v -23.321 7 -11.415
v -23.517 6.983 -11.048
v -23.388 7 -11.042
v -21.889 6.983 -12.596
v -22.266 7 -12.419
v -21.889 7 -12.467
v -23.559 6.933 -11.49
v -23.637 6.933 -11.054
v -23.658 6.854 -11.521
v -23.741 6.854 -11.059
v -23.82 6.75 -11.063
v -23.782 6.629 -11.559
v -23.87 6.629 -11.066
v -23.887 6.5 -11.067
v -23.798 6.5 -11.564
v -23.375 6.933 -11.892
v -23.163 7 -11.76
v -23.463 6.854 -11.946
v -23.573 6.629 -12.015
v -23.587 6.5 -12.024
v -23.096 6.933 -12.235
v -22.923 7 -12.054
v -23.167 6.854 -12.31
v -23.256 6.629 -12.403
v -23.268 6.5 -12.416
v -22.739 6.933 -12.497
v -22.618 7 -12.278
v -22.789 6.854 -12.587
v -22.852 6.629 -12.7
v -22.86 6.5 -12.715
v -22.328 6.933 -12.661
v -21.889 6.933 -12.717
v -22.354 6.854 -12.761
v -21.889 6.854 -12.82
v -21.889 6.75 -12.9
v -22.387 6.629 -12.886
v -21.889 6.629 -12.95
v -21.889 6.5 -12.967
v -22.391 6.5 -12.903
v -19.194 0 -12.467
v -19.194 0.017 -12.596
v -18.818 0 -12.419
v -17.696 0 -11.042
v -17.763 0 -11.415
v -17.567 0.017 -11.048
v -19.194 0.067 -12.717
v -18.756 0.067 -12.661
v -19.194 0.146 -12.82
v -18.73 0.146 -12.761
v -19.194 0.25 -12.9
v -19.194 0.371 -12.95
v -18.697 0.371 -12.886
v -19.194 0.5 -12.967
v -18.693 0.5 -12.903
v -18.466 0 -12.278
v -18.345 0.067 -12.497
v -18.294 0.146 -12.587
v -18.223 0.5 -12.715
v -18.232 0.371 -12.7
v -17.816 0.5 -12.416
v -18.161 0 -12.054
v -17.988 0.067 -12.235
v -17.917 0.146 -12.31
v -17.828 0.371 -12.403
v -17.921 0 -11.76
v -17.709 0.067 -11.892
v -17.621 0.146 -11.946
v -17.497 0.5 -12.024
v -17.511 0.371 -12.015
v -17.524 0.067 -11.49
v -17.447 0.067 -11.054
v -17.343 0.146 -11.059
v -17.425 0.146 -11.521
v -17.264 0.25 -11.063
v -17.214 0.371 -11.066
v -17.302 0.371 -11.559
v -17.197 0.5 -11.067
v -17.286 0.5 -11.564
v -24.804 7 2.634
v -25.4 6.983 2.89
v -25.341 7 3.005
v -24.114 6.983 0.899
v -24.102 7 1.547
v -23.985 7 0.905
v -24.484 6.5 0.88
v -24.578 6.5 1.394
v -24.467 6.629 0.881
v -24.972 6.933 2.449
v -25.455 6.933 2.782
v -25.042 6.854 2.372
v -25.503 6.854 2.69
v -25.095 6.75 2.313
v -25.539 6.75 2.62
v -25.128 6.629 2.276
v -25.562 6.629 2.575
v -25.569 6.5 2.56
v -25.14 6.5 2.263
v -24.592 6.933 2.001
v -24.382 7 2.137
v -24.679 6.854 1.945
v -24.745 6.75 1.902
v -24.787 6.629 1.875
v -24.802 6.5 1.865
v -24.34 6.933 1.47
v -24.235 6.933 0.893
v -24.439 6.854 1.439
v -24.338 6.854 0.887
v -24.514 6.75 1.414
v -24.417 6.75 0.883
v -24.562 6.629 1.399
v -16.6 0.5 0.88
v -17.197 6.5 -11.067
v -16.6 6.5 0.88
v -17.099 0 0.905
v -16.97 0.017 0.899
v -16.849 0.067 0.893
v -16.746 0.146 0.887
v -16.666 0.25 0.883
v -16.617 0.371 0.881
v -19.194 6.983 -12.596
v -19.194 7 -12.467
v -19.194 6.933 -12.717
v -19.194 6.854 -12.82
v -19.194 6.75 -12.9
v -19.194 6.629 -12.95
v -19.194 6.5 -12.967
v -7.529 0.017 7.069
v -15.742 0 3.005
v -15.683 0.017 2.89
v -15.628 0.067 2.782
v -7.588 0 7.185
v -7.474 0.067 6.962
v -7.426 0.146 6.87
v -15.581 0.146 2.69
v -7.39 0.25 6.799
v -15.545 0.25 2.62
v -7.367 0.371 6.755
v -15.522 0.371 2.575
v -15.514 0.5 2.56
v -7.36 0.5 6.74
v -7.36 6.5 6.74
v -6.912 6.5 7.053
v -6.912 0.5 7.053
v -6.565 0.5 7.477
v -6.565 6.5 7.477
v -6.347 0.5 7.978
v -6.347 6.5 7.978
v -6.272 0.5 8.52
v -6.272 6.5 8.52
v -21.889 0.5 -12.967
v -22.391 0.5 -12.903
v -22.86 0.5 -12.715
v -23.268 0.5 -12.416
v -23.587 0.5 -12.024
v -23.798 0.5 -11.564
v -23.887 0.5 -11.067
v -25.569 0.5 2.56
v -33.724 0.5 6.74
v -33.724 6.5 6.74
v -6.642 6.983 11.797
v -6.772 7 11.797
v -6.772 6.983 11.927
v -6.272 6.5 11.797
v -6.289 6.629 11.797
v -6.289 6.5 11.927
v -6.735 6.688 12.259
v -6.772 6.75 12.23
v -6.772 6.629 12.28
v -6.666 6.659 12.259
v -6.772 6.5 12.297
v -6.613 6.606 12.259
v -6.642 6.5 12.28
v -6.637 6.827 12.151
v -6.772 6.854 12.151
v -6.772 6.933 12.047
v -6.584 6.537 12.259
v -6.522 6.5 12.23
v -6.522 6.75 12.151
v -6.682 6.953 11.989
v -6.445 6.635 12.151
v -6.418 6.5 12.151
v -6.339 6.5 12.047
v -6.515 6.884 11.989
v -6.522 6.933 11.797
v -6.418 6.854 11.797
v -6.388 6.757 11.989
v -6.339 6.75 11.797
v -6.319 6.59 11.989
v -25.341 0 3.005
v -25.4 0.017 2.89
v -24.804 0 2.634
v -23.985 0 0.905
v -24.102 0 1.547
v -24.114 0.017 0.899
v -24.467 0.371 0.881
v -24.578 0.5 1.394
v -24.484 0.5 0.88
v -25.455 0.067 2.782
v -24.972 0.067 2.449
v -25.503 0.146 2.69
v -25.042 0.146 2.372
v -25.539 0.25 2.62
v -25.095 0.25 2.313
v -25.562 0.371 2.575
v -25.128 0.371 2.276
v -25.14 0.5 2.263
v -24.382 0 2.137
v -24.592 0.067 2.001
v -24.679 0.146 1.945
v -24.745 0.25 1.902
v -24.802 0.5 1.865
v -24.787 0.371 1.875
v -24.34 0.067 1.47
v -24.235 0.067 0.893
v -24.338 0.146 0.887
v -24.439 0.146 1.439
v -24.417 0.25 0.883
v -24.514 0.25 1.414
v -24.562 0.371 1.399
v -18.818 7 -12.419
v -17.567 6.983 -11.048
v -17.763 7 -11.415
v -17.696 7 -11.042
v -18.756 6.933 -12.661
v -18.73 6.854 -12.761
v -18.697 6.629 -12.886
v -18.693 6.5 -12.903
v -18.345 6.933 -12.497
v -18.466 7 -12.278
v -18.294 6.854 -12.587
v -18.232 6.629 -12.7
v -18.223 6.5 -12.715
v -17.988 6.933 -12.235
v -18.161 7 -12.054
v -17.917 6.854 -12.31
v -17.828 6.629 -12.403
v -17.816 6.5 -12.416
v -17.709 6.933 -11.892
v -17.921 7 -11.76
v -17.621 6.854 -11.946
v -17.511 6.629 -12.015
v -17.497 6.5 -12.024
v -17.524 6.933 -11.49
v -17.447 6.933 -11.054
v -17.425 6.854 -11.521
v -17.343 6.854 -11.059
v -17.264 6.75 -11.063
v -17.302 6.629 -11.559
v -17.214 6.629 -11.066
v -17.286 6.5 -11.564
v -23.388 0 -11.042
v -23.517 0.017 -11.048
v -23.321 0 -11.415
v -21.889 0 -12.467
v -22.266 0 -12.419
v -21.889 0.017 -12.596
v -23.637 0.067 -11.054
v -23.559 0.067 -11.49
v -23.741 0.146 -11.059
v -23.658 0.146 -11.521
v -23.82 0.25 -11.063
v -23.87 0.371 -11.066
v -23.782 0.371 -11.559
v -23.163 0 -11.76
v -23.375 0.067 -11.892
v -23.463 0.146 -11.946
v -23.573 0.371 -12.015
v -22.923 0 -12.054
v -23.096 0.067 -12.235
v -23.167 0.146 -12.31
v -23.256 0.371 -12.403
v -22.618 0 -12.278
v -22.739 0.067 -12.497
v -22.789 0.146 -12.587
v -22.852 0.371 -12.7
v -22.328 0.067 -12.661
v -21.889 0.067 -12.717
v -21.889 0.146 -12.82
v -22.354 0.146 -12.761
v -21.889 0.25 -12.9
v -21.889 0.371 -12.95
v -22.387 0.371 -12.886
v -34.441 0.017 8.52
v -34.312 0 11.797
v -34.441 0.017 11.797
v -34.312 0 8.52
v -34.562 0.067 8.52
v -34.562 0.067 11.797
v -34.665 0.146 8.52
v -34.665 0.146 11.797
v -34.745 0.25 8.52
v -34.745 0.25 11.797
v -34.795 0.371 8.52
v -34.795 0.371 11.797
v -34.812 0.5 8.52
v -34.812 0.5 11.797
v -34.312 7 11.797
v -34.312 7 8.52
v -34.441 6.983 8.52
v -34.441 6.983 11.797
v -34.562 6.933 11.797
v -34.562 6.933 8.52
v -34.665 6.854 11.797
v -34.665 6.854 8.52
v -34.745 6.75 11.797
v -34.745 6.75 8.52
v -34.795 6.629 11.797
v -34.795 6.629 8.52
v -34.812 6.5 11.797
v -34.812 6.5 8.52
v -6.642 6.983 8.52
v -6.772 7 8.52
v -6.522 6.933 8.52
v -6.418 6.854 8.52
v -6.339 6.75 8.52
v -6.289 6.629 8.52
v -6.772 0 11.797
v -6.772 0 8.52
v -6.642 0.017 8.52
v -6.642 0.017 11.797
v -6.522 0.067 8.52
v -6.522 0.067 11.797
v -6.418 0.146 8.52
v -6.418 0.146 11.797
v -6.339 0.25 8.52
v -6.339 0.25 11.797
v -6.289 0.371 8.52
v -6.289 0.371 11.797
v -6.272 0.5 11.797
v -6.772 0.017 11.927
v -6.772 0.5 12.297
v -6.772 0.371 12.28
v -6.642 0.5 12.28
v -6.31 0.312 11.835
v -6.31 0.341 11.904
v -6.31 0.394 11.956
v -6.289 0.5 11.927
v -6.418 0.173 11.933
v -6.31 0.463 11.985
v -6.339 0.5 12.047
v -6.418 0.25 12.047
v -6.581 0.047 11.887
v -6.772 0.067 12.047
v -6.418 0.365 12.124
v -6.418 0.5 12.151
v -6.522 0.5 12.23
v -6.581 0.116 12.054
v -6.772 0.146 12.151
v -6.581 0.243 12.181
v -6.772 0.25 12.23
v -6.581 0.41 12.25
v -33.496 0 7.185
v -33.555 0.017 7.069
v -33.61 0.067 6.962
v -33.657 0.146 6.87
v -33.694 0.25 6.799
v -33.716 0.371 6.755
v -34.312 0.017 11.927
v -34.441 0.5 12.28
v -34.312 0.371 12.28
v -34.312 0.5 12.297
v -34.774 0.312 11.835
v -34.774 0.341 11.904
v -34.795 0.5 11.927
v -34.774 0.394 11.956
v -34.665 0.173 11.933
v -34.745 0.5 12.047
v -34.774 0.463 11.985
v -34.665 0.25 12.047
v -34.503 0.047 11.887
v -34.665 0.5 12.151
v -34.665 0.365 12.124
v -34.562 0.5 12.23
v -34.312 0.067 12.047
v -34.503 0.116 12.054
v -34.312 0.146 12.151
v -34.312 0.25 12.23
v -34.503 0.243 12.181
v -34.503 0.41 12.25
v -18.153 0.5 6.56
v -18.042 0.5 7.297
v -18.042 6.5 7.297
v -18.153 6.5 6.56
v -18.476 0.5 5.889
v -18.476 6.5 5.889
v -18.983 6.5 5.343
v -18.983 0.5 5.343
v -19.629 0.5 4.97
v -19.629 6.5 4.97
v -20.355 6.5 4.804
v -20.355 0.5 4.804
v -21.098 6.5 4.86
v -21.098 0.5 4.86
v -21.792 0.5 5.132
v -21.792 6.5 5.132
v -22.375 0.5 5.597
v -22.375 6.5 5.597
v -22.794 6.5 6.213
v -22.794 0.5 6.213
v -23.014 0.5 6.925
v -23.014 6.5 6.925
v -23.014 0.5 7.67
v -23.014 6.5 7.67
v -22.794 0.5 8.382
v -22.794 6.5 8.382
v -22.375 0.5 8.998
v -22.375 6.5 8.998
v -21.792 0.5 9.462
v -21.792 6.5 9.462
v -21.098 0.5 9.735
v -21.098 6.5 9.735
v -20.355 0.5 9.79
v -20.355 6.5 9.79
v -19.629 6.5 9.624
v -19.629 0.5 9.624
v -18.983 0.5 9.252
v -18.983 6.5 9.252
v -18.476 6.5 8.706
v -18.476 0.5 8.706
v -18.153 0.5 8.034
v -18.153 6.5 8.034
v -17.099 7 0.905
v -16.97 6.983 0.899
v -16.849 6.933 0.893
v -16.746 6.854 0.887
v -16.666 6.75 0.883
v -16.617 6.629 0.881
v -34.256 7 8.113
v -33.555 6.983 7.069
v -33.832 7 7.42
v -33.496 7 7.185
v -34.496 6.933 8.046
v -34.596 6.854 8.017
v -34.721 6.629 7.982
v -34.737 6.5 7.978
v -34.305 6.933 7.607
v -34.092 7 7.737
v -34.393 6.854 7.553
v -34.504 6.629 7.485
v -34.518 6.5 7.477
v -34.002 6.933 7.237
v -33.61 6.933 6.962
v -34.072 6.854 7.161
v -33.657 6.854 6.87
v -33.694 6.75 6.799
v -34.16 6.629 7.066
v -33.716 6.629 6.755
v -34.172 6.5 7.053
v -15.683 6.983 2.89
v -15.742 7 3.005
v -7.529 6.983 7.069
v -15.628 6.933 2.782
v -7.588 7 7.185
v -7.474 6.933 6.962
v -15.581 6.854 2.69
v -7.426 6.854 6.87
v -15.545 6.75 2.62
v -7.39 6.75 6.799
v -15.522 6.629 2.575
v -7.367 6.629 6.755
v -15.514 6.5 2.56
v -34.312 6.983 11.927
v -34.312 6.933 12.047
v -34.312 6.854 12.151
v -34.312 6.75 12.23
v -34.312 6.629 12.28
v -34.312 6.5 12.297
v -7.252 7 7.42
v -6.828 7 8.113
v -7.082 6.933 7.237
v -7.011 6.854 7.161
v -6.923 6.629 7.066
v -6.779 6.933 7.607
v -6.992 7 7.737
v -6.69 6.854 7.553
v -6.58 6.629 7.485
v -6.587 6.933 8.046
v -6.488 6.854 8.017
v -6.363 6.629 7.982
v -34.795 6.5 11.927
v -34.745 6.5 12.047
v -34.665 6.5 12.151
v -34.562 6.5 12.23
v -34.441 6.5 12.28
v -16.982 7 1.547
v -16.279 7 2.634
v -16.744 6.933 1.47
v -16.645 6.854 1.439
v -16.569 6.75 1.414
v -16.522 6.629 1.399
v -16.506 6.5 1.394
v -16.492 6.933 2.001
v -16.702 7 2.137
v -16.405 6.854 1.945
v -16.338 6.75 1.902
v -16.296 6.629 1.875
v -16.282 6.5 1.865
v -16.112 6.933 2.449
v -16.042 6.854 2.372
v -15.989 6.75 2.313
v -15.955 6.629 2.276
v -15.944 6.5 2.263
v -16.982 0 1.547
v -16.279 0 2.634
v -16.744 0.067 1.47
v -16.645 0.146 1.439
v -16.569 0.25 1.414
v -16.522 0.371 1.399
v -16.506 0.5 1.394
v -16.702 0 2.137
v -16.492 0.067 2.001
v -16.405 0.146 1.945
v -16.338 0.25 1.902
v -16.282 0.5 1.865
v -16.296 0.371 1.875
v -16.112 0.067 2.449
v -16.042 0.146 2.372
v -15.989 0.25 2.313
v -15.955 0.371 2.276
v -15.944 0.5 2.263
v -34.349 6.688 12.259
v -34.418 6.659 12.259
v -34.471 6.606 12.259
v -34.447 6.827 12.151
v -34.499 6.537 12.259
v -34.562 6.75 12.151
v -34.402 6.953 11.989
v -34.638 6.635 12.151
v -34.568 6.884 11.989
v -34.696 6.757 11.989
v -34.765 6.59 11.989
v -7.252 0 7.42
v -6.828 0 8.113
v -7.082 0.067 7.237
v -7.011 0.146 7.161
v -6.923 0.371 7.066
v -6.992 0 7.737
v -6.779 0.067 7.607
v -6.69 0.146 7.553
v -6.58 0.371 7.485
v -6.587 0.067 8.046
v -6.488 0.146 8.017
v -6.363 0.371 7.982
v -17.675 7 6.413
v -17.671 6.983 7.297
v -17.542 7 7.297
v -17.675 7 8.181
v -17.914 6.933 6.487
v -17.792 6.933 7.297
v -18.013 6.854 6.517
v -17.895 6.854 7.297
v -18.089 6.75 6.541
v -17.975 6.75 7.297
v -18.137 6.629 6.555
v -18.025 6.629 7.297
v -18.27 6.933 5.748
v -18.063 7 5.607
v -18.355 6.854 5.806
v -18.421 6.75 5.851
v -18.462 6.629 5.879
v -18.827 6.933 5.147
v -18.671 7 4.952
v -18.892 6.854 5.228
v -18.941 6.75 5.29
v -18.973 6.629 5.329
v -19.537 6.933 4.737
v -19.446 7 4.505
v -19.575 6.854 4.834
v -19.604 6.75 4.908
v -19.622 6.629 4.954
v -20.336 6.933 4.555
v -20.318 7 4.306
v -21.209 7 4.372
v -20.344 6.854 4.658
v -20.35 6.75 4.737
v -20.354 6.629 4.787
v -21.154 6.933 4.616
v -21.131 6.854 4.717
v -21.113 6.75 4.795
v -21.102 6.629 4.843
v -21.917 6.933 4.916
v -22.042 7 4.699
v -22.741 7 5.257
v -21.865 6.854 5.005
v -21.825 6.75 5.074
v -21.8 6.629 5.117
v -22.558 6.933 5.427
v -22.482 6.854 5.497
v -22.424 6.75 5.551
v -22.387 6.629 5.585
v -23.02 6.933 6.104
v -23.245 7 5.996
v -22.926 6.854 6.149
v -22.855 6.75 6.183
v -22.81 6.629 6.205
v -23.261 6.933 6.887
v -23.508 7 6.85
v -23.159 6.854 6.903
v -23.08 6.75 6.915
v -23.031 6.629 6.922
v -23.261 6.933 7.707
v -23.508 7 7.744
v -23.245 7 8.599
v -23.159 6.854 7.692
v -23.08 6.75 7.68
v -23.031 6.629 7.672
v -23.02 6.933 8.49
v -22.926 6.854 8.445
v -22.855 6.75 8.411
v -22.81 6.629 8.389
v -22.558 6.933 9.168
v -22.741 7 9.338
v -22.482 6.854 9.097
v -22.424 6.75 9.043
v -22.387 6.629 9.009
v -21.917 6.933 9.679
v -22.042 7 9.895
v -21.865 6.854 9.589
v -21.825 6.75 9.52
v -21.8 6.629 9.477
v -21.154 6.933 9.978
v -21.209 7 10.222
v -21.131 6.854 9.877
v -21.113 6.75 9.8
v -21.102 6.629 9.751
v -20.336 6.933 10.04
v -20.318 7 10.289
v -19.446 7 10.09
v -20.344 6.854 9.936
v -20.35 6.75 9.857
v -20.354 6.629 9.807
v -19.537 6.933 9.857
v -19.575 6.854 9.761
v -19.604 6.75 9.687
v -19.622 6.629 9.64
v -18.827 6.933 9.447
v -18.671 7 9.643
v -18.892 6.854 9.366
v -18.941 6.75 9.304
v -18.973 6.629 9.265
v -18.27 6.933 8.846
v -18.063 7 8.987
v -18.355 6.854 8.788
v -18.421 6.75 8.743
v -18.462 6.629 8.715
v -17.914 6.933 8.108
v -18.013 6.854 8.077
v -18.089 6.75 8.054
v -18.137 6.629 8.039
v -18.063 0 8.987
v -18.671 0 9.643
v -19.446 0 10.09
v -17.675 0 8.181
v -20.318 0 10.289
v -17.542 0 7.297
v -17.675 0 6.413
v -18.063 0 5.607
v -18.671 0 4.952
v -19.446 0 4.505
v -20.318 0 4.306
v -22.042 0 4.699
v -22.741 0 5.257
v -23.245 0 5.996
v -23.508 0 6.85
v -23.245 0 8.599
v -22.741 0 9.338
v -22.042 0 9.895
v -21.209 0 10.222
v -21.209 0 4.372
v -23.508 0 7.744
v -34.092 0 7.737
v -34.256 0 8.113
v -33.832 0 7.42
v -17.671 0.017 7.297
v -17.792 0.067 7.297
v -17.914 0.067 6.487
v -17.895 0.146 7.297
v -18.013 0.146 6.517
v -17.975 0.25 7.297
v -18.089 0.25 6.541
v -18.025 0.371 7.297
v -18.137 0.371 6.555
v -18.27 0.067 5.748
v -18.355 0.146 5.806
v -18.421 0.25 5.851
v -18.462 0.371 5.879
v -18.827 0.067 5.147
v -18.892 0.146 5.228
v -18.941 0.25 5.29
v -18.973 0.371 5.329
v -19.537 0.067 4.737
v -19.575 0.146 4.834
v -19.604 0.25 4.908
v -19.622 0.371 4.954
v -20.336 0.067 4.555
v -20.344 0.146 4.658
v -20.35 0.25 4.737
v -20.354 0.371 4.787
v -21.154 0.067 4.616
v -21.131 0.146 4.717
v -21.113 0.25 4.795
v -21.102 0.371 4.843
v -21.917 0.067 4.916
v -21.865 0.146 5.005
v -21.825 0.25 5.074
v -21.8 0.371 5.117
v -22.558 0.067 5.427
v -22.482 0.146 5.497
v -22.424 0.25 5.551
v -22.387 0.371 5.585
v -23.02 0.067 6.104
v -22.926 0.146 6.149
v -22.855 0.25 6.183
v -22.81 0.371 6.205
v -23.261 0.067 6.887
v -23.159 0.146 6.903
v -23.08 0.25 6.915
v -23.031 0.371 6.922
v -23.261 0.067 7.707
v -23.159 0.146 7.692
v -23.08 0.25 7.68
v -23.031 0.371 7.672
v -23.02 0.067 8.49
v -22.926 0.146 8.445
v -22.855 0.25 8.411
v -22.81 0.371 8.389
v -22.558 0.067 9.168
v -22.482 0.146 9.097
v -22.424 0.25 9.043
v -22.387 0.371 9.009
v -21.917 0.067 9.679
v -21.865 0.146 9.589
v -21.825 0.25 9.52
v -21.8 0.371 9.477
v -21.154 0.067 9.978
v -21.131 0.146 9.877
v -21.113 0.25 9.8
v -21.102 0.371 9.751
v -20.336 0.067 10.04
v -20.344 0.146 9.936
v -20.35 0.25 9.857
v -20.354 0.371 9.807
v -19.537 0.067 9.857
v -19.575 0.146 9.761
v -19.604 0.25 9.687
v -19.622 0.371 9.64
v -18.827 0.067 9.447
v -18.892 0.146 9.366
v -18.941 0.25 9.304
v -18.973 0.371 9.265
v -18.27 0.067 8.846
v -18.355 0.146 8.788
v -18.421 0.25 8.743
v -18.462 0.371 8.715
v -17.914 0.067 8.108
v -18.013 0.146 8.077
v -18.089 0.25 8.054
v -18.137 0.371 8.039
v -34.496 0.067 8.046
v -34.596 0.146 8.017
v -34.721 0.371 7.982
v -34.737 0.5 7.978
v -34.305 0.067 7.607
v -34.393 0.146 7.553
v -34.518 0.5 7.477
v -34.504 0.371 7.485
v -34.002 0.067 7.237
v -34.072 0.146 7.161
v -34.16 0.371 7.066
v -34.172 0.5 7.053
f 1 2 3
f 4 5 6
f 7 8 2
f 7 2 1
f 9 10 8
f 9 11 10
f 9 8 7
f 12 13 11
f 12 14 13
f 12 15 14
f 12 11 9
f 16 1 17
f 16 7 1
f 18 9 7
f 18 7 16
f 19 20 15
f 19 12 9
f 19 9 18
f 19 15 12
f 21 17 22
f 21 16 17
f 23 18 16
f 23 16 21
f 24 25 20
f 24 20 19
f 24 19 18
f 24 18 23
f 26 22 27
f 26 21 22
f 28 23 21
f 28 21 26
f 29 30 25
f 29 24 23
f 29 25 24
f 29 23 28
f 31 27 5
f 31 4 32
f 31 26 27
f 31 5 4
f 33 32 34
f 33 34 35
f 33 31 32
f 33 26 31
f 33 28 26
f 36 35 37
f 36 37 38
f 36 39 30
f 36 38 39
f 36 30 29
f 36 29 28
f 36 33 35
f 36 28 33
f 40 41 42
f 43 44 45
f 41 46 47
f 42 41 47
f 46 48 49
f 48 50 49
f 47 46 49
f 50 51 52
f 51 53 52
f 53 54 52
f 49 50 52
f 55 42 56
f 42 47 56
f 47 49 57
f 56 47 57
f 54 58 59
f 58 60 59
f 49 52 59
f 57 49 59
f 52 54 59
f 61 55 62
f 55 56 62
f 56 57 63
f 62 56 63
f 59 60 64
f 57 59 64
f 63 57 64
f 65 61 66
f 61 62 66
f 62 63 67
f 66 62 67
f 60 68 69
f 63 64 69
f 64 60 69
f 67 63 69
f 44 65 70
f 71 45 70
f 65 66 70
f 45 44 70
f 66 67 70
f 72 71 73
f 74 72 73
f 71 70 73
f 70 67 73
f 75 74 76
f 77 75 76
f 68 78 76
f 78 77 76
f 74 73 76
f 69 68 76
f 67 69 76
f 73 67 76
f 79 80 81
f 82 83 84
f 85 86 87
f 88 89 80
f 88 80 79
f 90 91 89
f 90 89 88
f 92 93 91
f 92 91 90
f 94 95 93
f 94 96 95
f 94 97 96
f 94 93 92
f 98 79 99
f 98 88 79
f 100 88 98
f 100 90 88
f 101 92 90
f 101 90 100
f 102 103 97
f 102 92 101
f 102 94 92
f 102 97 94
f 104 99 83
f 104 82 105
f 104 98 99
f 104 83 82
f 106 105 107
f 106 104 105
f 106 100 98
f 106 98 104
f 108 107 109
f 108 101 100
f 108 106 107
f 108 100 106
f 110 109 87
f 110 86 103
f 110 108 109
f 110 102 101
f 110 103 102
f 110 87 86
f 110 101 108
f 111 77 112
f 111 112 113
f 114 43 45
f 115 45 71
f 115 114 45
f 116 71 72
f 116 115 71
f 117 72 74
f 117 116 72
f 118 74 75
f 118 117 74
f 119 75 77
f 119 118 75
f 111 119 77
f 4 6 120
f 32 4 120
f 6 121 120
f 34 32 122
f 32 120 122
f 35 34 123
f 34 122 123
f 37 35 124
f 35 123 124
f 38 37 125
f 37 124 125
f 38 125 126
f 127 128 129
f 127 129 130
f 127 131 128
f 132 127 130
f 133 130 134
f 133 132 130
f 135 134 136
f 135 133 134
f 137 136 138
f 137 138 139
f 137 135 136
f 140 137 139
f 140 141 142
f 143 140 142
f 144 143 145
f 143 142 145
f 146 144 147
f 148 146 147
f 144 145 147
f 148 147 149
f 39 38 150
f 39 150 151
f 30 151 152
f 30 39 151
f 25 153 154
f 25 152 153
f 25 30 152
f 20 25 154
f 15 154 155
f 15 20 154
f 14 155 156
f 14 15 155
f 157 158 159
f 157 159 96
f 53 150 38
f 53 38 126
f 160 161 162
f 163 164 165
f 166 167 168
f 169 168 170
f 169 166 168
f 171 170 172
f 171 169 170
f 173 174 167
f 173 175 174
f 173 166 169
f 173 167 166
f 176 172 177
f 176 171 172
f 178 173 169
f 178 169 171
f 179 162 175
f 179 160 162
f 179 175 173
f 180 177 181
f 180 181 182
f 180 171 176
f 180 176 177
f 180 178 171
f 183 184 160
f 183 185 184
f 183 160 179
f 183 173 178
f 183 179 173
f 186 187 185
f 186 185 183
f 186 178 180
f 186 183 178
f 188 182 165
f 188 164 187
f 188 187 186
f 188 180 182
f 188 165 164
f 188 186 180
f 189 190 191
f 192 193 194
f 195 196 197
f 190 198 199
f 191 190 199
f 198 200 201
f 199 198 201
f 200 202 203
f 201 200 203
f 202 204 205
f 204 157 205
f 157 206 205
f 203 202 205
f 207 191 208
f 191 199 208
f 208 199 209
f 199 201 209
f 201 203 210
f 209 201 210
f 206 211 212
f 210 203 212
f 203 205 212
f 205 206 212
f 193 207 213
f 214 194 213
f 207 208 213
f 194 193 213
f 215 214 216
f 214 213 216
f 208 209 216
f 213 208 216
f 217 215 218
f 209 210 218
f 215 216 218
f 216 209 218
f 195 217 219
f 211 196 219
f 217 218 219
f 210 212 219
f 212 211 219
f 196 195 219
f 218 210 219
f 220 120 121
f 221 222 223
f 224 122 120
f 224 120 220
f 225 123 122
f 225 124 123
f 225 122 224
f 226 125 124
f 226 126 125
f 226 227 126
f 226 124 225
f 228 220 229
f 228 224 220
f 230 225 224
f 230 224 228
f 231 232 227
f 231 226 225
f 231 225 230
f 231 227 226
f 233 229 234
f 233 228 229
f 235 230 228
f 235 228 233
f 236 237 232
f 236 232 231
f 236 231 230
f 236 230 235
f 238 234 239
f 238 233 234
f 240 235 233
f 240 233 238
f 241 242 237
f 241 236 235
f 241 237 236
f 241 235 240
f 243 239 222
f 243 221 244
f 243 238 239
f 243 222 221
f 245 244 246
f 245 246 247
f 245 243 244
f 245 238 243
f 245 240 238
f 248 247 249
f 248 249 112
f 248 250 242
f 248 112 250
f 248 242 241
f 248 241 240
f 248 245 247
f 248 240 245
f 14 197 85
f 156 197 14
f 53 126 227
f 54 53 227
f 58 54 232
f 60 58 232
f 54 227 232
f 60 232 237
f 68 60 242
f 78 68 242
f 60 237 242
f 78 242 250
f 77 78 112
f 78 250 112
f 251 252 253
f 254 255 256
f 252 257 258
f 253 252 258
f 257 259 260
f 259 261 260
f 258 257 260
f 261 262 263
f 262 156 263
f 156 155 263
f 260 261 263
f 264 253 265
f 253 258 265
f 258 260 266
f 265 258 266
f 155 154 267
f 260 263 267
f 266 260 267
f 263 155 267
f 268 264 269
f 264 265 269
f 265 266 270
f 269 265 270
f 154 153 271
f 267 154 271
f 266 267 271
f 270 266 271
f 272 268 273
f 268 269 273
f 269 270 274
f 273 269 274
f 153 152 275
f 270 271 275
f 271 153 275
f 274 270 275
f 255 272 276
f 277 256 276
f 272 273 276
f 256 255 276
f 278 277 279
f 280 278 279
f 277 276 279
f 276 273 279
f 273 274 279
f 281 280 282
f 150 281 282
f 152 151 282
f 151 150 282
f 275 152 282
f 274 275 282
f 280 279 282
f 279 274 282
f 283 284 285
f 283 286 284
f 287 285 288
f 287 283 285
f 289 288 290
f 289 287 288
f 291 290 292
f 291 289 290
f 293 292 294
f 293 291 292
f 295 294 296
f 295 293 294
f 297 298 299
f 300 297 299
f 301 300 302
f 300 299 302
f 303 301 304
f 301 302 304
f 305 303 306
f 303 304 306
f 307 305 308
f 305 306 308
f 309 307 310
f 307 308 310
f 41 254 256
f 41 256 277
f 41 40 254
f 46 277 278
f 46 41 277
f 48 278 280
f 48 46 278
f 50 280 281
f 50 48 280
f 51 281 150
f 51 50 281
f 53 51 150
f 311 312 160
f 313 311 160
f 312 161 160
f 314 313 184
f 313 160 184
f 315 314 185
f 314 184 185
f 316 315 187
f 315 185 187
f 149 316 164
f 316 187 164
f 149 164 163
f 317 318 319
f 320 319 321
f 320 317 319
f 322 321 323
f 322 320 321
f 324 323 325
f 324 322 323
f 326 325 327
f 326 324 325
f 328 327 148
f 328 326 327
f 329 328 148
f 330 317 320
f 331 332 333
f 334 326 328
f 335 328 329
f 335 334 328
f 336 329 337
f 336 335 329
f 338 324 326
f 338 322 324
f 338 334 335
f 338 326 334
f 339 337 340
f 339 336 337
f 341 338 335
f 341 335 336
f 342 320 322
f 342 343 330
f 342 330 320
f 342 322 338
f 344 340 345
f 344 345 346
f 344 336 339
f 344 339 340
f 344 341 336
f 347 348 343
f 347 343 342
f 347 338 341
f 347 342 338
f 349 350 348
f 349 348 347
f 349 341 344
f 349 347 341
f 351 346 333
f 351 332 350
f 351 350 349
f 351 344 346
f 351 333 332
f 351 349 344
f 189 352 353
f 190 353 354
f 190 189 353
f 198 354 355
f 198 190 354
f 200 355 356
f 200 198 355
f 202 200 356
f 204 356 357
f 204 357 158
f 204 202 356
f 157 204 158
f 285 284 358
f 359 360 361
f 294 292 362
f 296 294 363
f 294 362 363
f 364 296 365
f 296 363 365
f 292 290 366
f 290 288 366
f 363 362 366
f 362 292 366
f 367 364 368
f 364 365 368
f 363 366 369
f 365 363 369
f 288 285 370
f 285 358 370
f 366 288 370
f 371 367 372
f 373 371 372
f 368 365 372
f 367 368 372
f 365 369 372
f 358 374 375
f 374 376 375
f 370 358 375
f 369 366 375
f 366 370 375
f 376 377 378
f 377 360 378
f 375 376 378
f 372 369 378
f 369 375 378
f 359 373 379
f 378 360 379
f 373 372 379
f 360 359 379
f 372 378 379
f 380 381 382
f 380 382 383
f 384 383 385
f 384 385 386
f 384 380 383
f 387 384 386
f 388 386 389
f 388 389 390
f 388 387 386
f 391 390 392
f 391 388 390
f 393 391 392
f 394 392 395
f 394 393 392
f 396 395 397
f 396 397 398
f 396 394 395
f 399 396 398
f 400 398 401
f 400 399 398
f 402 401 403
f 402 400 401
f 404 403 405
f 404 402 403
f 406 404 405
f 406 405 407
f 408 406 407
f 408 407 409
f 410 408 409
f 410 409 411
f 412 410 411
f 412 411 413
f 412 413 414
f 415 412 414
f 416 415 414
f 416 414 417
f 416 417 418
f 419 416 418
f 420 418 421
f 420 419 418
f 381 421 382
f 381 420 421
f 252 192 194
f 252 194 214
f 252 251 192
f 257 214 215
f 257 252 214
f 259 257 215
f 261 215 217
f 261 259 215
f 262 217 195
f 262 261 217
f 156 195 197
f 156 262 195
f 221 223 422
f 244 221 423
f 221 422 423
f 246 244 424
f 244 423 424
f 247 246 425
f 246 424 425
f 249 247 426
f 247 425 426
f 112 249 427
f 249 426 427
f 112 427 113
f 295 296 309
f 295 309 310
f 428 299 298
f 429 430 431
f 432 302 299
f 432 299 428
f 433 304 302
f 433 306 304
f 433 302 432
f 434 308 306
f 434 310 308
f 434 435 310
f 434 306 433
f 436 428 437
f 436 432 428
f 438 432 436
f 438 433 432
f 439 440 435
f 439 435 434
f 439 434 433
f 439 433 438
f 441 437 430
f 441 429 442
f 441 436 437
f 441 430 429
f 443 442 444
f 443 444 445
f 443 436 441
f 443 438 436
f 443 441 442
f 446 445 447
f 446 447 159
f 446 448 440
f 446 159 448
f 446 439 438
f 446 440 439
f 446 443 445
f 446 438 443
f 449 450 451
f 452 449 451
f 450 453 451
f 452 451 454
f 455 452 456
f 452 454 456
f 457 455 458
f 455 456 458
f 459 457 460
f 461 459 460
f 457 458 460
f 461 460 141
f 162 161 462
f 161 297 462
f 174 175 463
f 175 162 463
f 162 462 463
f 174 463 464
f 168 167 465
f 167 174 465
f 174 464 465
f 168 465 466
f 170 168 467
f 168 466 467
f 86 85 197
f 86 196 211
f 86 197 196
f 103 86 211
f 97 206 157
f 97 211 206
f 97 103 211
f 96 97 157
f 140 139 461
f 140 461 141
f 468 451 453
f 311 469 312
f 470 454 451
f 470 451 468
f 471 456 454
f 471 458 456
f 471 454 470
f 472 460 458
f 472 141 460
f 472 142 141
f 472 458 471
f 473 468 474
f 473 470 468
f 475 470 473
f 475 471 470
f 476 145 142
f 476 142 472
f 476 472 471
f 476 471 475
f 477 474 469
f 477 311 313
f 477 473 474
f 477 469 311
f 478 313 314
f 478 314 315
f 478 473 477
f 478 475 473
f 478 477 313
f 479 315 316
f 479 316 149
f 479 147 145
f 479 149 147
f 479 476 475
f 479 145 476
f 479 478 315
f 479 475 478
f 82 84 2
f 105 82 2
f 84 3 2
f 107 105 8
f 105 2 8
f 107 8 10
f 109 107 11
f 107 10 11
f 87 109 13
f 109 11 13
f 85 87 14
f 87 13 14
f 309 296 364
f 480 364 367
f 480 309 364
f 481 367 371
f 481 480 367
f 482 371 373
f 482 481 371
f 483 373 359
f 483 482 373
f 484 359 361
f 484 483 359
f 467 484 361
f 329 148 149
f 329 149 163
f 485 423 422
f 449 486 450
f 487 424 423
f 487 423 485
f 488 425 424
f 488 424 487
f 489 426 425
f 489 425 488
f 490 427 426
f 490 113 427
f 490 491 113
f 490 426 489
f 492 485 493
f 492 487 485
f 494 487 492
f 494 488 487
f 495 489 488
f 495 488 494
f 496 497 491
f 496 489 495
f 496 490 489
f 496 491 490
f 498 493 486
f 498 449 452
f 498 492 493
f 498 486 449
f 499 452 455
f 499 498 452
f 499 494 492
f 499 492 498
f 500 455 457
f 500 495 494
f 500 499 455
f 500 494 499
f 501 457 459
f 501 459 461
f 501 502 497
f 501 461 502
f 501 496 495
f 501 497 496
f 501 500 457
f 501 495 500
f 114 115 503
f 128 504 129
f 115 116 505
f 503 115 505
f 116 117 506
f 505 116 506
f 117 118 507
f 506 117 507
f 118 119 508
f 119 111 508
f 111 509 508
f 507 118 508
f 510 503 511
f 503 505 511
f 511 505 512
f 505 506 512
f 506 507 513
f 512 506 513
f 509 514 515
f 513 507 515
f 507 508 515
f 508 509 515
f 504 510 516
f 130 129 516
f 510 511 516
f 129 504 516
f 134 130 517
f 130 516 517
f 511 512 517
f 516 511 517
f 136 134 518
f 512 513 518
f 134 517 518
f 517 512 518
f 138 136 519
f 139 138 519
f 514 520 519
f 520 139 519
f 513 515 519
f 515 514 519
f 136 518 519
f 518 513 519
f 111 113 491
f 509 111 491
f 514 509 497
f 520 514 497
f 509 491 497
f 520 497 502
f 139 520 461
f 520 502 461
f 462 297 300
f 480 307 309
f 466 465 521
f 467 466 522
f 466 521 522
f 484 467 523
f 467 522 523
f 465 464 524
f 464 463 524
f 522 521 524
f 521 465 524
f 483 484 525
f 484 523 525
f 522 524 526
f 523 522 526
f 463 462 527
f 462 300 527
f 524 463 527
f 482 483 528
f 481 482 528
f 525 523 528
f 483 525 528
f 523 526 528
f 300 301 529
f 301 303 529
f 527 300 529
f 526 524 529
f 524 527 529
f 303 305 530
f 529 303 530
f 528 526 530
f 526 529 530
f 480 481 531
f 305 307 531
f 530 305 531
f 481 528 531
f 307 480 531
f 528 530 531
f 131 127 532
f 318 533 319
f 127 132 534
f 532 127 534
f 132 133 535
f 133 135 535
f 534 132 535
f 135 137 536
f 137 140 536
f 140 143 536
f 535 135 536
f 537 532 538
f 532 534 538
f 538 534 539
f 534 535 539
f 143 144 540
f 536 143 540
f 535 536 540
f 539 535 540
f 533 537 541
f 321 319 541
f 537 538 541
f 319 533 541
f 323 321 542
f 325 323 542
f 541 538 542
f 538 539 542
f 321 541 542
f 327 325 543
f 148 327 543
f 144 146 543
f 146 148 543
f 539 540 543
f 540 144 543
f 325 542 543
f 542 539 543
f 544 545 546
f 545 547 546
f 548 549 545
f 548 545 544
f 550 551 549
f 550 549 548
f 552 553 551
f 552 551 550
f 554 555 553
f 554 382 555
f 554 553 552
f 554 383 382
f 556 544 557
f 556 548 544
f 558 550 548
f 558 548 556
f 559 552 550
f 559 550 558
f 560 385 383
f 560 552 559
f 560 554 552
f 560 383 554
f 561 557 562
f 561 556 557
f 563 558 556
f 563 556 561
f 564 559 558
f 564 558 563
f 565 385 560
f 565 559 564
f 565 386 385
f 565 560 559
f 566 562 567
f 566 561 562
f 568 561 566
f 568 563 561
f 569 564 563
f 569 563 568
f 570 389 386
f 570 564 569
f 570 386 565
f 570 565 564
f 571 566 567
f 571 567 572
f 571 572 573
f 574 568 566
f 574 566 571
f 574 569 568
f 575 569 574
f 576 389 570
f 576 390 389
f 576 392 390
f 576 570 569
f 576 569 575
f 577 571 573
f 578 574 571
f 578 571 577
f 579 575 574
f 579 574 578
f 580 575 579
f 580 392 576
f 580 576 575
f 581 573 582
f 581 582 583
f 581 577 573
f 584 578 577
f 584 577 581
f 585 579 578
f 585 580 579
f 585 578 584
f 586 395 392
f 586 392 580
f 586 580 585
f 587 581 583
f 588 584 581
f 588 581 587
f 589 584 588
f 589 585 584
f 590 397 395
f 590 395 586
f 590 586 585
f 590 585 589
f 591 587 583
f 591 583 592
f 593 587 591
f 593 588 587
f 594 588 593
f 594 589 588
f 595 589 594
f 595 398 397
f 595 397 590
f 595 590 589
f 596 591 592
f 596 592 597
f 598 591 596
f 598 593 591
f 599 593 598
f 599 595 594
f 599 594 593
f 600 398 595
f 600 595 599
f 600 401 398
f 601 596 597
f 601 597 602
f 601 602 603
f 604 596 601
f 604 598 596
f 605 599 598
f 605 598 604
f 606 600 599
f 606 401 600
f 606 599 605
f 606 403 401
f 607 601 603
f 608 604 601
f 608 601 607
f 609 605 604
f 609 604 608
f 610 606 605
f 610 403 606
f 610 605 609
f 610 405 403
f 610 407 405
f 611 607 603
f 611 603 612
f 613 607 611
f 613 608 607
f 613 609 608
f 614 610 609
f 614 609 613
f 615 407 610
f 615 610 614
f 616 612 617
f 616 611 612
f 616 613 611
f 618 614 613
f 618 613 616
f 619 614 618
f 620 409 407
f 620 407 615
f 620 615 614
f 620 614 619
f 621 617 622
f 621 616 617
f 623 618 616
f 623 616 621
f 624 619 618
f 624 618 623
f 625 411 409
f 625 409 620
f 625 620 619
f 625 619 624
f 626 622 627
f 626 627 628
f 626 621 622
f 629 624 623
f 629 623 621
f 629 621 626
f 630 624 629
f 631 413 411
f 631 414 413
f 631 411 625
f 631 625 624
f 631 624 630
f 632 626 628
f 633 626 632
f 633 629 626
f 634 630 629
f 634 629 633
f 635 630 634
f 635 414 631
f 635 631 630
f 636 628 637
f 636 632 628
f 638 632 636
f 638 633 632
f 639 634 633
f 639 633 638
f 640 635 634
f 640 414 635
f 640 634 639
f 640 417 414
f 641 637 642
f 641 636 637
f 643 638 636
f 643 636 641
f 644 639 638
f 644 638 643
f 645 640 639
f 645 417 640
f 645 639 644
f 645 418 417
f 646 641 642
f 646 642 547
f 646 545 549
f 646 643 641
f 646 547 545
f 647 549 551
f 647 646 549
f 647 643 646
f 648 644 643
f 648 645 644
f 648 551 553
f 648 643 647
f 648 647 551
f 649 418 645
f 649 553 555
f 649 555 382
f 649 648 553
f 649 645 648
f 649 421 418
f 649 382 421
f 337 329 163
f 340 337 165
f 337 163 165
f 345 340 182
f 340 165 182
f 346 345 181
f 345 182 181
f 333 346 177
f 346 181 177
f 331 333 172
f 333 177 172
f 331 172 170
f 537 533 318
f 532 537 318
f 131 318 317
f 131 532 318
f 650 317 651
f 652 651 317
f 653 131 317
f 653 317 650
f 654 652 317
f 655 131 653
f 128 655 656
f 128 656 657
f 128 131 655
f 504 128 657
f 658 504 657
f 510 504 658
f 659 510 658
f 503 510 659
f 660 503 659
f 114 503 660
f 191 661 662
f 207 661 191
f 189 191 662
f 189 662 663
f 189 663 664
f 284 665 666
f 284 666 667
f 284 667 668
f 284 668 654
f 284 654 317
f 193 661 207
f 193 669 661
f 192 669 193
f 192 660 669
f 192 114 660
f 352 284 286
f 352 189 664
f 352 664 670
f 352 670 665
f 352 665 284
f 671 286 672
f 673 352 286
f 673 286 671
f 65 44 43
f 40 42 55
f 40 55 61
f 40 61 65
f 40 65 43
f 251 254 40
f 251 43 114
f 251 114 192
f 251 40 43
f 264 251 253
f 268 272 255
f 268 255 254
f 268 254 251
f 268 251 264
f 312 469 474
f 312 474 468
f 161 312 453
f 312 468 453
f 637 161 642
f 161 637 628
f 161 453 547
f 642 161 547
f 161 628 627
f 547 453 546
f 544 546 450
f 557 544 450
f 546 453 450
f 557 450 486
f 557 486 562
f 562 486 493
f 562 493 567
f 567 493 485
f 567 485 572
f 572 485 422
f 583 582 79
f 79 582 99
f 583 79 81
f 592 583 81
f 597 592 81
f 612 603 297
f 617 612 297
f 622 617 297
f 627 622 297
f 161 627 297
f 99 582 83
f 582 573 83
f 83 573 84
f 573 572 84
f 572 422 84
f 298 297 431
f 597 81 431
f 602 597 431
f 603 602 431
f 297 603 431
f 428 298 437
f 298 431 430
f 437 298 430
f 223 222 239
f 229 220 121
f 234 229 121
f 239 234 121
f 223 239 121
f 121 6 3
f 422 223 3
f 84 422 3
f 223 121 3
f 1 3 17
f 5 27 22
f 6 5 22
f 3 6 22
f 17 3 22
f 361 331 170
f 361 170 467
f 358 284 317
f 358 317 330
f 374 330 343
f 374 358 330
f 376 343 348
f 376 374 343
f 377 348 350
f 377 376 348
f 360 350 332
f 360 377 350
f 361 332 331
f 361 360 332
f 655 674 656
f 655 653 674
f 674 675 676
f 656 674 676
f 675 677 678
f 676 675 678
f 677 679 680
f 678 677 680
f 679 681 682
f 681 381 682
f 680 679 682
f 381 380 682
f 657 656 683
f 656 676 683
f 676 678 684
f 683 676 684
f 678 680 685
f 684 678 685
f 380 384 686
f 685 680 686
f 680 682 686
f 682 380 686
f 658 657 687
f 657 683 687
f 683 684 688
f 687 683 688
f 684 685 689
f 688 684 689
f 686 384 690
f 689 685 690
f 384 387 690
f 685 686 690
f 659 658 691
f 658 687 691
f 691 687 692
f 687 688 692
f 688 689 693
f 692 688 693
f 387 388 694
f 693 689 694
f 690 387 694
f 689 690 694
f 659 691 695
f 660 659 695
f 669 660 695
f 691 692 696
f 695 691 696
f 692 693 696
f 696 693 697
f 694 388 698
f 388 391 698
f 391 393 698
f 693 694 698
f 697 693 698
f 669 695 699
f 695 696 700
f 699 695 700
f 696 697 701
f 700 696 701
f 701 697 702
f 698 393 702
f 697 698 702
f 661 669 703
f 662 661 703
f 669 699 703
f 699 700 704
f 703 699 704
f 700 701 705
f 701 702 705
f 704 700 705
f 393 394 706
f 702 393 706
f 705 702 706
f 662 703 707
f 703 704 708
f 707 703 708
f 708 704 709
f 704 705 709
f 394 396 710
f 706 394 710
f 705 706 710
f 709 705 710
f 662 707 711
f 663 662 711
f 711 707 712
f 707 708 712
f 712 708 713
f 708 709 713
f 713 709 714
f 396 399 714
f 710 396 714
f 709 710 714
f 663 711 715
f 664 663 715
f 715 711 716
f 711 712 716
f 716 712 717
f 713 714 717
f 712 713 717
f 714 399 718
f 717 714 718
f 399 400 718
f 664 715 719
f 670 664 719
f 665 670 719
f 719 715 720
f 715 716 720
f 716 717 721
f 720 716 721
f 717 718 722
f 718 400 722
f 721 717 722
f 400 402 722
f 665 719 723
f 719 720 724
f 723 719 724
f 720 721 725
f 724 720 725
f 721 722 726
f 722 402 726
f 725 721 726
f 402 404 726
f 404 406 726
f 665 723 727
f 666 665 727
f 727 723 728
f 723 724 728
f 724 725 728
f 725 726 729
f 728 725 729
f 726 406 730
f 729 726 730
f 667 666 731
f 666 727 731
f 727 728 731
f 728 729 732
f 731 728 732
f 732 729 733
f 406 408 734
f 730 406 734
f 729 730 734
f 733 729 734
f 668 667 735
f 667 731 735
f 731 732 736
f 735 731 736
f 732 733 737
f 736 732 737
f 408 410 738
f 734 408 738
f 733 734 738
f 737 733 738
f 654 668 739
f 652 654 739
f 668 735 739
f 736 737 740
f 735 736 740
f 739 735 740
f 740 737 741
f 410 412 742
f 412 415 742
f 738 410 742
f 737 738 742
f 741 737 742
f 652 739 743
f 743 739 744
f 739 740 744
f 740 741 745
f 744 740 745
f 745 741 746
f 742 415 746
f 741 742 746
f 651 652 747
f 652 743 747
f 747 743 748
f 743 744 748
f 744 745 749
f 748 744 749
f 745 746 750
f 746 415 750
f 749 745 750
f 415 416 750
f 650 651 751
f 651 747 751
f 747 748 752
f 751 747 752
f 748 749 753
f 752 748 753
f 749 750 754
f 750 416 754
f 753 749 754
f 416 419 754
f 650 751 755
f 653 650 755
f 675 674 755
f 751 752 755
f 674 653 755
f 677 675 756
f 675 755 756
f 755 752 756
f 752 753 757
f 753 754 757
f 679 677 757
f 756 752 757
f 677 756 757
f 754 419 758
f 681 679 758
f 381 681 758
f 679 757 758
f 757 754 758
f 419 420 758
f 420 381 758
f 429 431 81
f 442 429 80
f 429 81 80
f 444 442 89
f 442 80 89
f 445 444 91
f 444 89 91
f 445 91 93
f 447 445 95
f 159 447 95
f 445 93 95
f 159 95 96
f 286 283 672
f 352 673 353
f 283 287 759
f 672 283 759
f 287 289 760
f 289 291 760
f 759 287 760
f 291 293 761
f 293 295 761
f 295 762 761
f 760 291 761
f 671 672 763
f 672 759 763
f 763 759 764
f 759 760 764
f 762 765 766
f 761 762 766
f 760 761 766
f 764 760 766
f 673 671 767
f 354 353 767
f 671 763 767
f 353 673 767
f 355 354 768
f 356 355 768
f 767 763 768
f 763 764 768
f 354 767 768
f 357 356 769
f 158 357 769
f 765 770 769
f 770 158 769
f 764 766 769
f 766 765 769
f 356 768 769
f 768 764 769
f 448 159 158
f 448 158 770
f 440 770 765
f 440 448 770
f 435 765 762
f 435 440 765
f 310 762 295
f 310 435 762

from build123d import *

# Parameters (mm, degrees)
SKETCH1_R           = 2.5
BOSS_EXTRUDE1_DEPTH = 7
FILLET1_R           = 2
FILLET2_R           = 0.5


with BuildPart() as part:
    # Sketch1 → Boss-Extrude1 (new body)
    with BuildSketch(Plane(origin=(0, 0, 0), x_dir=(1, 0, 0), z_dir=(0, 1, 0))):
        Polygon((-23.791870344, 12.96668262), (-17.291870344, 12.96668262), (-16.541870344, -2.03331738), (-6.271908742, -7.297228373), (-6.271908742, -12.297228373), (-34.811831945, -12.297228373), (-34.811831945, -7.297228373), (-24.541870344, -2.03331738), align=None)
        with Locations((-20.541870344, -7.297228373)):
            Circle(SKETCH1_R, mode=Mode.SUBTRACT)
    extrude(amount=BOSS_EXTRUDE1_DEPTH)

    # Fillet1
    fillet1_edges = [part.edges().sort_by_distance(p)[0] for p in [
        (-23.791870344, 3.5, -12.96668262),
        (-17.291870344, 3.5, -12.96668262),
        (-16.541870344, 3.5, 2.03331738),
        (-6.271908742, 3.5, 7.297228373),
        (-34.811831945, 3.5, 7.297228373),
        (-24.541870344, 3.5, 2.03331738),
    ]]
    fillet(fillet1_edges, radius=FILLET1_R)

    # Fillet2
    fillet2_edges = [part.edges().sort_by_distance(p)[0] for p in [
        (-20.541870344, 0, 12.297228373),
        (-34.811831945, 7, 10.408378726),
        (-34.811831945, 0, 10.408378726),
        (-20.541870344, 7, 12.297228373),
        (-6.271908742, 3.5, 12.297228373),
        (-34.811831945, 3.5, 12.297228373),
        (-11.436968701, 0, 4.649855681),
        (-11.436968701, 7, 4.649855681),
        (-24.185541966, 0, -5.093250169),
        (-20.541870344, 0, -12.96668262),
        (-16.898198721, 0, -5.093250169),
        (-6.271908742, 0, 10.408378726),
        (-29.646771987, 0, 4.649855681),
        (-17.815918651, 0, -12.415777246),
        (-23.267822036, 0, -12.415777246),
        (-34.518365815, 0, 7.476580302),
        (-6.565374872, 0, 7.476580302),
        (-6.271908742, 7, 10.408378726),
        (-23.041870344, 7, 7.297228373),
        (-24.185541966, 7, -5.093250169),
        (-29.646771987, 7, 4.649855681),
        (-16.898198721, 7, -5.093250169),
        (-20.541870344, 7, -12.96668262),
        (-17.815918651, 7, -12.415777246),
        (-23.267822036, 7, -12.415777246),
        (-34.518365815, 7, 7.476580302),
        (-6.565374872, 7, 7.476580302),
        (-16.281980837, 0, 1.865429111),
        (-16.281980837, 7, 1.865429111),
        (-24.80175985, 0, 1.865429111),
        (-24.80175985, 7, 1.865429111),
        (-23.041870344, 0, 7.297228373),
    ]]
    fillet(fillet2_edges, radius=FILLET2_R)


solid = part.part
